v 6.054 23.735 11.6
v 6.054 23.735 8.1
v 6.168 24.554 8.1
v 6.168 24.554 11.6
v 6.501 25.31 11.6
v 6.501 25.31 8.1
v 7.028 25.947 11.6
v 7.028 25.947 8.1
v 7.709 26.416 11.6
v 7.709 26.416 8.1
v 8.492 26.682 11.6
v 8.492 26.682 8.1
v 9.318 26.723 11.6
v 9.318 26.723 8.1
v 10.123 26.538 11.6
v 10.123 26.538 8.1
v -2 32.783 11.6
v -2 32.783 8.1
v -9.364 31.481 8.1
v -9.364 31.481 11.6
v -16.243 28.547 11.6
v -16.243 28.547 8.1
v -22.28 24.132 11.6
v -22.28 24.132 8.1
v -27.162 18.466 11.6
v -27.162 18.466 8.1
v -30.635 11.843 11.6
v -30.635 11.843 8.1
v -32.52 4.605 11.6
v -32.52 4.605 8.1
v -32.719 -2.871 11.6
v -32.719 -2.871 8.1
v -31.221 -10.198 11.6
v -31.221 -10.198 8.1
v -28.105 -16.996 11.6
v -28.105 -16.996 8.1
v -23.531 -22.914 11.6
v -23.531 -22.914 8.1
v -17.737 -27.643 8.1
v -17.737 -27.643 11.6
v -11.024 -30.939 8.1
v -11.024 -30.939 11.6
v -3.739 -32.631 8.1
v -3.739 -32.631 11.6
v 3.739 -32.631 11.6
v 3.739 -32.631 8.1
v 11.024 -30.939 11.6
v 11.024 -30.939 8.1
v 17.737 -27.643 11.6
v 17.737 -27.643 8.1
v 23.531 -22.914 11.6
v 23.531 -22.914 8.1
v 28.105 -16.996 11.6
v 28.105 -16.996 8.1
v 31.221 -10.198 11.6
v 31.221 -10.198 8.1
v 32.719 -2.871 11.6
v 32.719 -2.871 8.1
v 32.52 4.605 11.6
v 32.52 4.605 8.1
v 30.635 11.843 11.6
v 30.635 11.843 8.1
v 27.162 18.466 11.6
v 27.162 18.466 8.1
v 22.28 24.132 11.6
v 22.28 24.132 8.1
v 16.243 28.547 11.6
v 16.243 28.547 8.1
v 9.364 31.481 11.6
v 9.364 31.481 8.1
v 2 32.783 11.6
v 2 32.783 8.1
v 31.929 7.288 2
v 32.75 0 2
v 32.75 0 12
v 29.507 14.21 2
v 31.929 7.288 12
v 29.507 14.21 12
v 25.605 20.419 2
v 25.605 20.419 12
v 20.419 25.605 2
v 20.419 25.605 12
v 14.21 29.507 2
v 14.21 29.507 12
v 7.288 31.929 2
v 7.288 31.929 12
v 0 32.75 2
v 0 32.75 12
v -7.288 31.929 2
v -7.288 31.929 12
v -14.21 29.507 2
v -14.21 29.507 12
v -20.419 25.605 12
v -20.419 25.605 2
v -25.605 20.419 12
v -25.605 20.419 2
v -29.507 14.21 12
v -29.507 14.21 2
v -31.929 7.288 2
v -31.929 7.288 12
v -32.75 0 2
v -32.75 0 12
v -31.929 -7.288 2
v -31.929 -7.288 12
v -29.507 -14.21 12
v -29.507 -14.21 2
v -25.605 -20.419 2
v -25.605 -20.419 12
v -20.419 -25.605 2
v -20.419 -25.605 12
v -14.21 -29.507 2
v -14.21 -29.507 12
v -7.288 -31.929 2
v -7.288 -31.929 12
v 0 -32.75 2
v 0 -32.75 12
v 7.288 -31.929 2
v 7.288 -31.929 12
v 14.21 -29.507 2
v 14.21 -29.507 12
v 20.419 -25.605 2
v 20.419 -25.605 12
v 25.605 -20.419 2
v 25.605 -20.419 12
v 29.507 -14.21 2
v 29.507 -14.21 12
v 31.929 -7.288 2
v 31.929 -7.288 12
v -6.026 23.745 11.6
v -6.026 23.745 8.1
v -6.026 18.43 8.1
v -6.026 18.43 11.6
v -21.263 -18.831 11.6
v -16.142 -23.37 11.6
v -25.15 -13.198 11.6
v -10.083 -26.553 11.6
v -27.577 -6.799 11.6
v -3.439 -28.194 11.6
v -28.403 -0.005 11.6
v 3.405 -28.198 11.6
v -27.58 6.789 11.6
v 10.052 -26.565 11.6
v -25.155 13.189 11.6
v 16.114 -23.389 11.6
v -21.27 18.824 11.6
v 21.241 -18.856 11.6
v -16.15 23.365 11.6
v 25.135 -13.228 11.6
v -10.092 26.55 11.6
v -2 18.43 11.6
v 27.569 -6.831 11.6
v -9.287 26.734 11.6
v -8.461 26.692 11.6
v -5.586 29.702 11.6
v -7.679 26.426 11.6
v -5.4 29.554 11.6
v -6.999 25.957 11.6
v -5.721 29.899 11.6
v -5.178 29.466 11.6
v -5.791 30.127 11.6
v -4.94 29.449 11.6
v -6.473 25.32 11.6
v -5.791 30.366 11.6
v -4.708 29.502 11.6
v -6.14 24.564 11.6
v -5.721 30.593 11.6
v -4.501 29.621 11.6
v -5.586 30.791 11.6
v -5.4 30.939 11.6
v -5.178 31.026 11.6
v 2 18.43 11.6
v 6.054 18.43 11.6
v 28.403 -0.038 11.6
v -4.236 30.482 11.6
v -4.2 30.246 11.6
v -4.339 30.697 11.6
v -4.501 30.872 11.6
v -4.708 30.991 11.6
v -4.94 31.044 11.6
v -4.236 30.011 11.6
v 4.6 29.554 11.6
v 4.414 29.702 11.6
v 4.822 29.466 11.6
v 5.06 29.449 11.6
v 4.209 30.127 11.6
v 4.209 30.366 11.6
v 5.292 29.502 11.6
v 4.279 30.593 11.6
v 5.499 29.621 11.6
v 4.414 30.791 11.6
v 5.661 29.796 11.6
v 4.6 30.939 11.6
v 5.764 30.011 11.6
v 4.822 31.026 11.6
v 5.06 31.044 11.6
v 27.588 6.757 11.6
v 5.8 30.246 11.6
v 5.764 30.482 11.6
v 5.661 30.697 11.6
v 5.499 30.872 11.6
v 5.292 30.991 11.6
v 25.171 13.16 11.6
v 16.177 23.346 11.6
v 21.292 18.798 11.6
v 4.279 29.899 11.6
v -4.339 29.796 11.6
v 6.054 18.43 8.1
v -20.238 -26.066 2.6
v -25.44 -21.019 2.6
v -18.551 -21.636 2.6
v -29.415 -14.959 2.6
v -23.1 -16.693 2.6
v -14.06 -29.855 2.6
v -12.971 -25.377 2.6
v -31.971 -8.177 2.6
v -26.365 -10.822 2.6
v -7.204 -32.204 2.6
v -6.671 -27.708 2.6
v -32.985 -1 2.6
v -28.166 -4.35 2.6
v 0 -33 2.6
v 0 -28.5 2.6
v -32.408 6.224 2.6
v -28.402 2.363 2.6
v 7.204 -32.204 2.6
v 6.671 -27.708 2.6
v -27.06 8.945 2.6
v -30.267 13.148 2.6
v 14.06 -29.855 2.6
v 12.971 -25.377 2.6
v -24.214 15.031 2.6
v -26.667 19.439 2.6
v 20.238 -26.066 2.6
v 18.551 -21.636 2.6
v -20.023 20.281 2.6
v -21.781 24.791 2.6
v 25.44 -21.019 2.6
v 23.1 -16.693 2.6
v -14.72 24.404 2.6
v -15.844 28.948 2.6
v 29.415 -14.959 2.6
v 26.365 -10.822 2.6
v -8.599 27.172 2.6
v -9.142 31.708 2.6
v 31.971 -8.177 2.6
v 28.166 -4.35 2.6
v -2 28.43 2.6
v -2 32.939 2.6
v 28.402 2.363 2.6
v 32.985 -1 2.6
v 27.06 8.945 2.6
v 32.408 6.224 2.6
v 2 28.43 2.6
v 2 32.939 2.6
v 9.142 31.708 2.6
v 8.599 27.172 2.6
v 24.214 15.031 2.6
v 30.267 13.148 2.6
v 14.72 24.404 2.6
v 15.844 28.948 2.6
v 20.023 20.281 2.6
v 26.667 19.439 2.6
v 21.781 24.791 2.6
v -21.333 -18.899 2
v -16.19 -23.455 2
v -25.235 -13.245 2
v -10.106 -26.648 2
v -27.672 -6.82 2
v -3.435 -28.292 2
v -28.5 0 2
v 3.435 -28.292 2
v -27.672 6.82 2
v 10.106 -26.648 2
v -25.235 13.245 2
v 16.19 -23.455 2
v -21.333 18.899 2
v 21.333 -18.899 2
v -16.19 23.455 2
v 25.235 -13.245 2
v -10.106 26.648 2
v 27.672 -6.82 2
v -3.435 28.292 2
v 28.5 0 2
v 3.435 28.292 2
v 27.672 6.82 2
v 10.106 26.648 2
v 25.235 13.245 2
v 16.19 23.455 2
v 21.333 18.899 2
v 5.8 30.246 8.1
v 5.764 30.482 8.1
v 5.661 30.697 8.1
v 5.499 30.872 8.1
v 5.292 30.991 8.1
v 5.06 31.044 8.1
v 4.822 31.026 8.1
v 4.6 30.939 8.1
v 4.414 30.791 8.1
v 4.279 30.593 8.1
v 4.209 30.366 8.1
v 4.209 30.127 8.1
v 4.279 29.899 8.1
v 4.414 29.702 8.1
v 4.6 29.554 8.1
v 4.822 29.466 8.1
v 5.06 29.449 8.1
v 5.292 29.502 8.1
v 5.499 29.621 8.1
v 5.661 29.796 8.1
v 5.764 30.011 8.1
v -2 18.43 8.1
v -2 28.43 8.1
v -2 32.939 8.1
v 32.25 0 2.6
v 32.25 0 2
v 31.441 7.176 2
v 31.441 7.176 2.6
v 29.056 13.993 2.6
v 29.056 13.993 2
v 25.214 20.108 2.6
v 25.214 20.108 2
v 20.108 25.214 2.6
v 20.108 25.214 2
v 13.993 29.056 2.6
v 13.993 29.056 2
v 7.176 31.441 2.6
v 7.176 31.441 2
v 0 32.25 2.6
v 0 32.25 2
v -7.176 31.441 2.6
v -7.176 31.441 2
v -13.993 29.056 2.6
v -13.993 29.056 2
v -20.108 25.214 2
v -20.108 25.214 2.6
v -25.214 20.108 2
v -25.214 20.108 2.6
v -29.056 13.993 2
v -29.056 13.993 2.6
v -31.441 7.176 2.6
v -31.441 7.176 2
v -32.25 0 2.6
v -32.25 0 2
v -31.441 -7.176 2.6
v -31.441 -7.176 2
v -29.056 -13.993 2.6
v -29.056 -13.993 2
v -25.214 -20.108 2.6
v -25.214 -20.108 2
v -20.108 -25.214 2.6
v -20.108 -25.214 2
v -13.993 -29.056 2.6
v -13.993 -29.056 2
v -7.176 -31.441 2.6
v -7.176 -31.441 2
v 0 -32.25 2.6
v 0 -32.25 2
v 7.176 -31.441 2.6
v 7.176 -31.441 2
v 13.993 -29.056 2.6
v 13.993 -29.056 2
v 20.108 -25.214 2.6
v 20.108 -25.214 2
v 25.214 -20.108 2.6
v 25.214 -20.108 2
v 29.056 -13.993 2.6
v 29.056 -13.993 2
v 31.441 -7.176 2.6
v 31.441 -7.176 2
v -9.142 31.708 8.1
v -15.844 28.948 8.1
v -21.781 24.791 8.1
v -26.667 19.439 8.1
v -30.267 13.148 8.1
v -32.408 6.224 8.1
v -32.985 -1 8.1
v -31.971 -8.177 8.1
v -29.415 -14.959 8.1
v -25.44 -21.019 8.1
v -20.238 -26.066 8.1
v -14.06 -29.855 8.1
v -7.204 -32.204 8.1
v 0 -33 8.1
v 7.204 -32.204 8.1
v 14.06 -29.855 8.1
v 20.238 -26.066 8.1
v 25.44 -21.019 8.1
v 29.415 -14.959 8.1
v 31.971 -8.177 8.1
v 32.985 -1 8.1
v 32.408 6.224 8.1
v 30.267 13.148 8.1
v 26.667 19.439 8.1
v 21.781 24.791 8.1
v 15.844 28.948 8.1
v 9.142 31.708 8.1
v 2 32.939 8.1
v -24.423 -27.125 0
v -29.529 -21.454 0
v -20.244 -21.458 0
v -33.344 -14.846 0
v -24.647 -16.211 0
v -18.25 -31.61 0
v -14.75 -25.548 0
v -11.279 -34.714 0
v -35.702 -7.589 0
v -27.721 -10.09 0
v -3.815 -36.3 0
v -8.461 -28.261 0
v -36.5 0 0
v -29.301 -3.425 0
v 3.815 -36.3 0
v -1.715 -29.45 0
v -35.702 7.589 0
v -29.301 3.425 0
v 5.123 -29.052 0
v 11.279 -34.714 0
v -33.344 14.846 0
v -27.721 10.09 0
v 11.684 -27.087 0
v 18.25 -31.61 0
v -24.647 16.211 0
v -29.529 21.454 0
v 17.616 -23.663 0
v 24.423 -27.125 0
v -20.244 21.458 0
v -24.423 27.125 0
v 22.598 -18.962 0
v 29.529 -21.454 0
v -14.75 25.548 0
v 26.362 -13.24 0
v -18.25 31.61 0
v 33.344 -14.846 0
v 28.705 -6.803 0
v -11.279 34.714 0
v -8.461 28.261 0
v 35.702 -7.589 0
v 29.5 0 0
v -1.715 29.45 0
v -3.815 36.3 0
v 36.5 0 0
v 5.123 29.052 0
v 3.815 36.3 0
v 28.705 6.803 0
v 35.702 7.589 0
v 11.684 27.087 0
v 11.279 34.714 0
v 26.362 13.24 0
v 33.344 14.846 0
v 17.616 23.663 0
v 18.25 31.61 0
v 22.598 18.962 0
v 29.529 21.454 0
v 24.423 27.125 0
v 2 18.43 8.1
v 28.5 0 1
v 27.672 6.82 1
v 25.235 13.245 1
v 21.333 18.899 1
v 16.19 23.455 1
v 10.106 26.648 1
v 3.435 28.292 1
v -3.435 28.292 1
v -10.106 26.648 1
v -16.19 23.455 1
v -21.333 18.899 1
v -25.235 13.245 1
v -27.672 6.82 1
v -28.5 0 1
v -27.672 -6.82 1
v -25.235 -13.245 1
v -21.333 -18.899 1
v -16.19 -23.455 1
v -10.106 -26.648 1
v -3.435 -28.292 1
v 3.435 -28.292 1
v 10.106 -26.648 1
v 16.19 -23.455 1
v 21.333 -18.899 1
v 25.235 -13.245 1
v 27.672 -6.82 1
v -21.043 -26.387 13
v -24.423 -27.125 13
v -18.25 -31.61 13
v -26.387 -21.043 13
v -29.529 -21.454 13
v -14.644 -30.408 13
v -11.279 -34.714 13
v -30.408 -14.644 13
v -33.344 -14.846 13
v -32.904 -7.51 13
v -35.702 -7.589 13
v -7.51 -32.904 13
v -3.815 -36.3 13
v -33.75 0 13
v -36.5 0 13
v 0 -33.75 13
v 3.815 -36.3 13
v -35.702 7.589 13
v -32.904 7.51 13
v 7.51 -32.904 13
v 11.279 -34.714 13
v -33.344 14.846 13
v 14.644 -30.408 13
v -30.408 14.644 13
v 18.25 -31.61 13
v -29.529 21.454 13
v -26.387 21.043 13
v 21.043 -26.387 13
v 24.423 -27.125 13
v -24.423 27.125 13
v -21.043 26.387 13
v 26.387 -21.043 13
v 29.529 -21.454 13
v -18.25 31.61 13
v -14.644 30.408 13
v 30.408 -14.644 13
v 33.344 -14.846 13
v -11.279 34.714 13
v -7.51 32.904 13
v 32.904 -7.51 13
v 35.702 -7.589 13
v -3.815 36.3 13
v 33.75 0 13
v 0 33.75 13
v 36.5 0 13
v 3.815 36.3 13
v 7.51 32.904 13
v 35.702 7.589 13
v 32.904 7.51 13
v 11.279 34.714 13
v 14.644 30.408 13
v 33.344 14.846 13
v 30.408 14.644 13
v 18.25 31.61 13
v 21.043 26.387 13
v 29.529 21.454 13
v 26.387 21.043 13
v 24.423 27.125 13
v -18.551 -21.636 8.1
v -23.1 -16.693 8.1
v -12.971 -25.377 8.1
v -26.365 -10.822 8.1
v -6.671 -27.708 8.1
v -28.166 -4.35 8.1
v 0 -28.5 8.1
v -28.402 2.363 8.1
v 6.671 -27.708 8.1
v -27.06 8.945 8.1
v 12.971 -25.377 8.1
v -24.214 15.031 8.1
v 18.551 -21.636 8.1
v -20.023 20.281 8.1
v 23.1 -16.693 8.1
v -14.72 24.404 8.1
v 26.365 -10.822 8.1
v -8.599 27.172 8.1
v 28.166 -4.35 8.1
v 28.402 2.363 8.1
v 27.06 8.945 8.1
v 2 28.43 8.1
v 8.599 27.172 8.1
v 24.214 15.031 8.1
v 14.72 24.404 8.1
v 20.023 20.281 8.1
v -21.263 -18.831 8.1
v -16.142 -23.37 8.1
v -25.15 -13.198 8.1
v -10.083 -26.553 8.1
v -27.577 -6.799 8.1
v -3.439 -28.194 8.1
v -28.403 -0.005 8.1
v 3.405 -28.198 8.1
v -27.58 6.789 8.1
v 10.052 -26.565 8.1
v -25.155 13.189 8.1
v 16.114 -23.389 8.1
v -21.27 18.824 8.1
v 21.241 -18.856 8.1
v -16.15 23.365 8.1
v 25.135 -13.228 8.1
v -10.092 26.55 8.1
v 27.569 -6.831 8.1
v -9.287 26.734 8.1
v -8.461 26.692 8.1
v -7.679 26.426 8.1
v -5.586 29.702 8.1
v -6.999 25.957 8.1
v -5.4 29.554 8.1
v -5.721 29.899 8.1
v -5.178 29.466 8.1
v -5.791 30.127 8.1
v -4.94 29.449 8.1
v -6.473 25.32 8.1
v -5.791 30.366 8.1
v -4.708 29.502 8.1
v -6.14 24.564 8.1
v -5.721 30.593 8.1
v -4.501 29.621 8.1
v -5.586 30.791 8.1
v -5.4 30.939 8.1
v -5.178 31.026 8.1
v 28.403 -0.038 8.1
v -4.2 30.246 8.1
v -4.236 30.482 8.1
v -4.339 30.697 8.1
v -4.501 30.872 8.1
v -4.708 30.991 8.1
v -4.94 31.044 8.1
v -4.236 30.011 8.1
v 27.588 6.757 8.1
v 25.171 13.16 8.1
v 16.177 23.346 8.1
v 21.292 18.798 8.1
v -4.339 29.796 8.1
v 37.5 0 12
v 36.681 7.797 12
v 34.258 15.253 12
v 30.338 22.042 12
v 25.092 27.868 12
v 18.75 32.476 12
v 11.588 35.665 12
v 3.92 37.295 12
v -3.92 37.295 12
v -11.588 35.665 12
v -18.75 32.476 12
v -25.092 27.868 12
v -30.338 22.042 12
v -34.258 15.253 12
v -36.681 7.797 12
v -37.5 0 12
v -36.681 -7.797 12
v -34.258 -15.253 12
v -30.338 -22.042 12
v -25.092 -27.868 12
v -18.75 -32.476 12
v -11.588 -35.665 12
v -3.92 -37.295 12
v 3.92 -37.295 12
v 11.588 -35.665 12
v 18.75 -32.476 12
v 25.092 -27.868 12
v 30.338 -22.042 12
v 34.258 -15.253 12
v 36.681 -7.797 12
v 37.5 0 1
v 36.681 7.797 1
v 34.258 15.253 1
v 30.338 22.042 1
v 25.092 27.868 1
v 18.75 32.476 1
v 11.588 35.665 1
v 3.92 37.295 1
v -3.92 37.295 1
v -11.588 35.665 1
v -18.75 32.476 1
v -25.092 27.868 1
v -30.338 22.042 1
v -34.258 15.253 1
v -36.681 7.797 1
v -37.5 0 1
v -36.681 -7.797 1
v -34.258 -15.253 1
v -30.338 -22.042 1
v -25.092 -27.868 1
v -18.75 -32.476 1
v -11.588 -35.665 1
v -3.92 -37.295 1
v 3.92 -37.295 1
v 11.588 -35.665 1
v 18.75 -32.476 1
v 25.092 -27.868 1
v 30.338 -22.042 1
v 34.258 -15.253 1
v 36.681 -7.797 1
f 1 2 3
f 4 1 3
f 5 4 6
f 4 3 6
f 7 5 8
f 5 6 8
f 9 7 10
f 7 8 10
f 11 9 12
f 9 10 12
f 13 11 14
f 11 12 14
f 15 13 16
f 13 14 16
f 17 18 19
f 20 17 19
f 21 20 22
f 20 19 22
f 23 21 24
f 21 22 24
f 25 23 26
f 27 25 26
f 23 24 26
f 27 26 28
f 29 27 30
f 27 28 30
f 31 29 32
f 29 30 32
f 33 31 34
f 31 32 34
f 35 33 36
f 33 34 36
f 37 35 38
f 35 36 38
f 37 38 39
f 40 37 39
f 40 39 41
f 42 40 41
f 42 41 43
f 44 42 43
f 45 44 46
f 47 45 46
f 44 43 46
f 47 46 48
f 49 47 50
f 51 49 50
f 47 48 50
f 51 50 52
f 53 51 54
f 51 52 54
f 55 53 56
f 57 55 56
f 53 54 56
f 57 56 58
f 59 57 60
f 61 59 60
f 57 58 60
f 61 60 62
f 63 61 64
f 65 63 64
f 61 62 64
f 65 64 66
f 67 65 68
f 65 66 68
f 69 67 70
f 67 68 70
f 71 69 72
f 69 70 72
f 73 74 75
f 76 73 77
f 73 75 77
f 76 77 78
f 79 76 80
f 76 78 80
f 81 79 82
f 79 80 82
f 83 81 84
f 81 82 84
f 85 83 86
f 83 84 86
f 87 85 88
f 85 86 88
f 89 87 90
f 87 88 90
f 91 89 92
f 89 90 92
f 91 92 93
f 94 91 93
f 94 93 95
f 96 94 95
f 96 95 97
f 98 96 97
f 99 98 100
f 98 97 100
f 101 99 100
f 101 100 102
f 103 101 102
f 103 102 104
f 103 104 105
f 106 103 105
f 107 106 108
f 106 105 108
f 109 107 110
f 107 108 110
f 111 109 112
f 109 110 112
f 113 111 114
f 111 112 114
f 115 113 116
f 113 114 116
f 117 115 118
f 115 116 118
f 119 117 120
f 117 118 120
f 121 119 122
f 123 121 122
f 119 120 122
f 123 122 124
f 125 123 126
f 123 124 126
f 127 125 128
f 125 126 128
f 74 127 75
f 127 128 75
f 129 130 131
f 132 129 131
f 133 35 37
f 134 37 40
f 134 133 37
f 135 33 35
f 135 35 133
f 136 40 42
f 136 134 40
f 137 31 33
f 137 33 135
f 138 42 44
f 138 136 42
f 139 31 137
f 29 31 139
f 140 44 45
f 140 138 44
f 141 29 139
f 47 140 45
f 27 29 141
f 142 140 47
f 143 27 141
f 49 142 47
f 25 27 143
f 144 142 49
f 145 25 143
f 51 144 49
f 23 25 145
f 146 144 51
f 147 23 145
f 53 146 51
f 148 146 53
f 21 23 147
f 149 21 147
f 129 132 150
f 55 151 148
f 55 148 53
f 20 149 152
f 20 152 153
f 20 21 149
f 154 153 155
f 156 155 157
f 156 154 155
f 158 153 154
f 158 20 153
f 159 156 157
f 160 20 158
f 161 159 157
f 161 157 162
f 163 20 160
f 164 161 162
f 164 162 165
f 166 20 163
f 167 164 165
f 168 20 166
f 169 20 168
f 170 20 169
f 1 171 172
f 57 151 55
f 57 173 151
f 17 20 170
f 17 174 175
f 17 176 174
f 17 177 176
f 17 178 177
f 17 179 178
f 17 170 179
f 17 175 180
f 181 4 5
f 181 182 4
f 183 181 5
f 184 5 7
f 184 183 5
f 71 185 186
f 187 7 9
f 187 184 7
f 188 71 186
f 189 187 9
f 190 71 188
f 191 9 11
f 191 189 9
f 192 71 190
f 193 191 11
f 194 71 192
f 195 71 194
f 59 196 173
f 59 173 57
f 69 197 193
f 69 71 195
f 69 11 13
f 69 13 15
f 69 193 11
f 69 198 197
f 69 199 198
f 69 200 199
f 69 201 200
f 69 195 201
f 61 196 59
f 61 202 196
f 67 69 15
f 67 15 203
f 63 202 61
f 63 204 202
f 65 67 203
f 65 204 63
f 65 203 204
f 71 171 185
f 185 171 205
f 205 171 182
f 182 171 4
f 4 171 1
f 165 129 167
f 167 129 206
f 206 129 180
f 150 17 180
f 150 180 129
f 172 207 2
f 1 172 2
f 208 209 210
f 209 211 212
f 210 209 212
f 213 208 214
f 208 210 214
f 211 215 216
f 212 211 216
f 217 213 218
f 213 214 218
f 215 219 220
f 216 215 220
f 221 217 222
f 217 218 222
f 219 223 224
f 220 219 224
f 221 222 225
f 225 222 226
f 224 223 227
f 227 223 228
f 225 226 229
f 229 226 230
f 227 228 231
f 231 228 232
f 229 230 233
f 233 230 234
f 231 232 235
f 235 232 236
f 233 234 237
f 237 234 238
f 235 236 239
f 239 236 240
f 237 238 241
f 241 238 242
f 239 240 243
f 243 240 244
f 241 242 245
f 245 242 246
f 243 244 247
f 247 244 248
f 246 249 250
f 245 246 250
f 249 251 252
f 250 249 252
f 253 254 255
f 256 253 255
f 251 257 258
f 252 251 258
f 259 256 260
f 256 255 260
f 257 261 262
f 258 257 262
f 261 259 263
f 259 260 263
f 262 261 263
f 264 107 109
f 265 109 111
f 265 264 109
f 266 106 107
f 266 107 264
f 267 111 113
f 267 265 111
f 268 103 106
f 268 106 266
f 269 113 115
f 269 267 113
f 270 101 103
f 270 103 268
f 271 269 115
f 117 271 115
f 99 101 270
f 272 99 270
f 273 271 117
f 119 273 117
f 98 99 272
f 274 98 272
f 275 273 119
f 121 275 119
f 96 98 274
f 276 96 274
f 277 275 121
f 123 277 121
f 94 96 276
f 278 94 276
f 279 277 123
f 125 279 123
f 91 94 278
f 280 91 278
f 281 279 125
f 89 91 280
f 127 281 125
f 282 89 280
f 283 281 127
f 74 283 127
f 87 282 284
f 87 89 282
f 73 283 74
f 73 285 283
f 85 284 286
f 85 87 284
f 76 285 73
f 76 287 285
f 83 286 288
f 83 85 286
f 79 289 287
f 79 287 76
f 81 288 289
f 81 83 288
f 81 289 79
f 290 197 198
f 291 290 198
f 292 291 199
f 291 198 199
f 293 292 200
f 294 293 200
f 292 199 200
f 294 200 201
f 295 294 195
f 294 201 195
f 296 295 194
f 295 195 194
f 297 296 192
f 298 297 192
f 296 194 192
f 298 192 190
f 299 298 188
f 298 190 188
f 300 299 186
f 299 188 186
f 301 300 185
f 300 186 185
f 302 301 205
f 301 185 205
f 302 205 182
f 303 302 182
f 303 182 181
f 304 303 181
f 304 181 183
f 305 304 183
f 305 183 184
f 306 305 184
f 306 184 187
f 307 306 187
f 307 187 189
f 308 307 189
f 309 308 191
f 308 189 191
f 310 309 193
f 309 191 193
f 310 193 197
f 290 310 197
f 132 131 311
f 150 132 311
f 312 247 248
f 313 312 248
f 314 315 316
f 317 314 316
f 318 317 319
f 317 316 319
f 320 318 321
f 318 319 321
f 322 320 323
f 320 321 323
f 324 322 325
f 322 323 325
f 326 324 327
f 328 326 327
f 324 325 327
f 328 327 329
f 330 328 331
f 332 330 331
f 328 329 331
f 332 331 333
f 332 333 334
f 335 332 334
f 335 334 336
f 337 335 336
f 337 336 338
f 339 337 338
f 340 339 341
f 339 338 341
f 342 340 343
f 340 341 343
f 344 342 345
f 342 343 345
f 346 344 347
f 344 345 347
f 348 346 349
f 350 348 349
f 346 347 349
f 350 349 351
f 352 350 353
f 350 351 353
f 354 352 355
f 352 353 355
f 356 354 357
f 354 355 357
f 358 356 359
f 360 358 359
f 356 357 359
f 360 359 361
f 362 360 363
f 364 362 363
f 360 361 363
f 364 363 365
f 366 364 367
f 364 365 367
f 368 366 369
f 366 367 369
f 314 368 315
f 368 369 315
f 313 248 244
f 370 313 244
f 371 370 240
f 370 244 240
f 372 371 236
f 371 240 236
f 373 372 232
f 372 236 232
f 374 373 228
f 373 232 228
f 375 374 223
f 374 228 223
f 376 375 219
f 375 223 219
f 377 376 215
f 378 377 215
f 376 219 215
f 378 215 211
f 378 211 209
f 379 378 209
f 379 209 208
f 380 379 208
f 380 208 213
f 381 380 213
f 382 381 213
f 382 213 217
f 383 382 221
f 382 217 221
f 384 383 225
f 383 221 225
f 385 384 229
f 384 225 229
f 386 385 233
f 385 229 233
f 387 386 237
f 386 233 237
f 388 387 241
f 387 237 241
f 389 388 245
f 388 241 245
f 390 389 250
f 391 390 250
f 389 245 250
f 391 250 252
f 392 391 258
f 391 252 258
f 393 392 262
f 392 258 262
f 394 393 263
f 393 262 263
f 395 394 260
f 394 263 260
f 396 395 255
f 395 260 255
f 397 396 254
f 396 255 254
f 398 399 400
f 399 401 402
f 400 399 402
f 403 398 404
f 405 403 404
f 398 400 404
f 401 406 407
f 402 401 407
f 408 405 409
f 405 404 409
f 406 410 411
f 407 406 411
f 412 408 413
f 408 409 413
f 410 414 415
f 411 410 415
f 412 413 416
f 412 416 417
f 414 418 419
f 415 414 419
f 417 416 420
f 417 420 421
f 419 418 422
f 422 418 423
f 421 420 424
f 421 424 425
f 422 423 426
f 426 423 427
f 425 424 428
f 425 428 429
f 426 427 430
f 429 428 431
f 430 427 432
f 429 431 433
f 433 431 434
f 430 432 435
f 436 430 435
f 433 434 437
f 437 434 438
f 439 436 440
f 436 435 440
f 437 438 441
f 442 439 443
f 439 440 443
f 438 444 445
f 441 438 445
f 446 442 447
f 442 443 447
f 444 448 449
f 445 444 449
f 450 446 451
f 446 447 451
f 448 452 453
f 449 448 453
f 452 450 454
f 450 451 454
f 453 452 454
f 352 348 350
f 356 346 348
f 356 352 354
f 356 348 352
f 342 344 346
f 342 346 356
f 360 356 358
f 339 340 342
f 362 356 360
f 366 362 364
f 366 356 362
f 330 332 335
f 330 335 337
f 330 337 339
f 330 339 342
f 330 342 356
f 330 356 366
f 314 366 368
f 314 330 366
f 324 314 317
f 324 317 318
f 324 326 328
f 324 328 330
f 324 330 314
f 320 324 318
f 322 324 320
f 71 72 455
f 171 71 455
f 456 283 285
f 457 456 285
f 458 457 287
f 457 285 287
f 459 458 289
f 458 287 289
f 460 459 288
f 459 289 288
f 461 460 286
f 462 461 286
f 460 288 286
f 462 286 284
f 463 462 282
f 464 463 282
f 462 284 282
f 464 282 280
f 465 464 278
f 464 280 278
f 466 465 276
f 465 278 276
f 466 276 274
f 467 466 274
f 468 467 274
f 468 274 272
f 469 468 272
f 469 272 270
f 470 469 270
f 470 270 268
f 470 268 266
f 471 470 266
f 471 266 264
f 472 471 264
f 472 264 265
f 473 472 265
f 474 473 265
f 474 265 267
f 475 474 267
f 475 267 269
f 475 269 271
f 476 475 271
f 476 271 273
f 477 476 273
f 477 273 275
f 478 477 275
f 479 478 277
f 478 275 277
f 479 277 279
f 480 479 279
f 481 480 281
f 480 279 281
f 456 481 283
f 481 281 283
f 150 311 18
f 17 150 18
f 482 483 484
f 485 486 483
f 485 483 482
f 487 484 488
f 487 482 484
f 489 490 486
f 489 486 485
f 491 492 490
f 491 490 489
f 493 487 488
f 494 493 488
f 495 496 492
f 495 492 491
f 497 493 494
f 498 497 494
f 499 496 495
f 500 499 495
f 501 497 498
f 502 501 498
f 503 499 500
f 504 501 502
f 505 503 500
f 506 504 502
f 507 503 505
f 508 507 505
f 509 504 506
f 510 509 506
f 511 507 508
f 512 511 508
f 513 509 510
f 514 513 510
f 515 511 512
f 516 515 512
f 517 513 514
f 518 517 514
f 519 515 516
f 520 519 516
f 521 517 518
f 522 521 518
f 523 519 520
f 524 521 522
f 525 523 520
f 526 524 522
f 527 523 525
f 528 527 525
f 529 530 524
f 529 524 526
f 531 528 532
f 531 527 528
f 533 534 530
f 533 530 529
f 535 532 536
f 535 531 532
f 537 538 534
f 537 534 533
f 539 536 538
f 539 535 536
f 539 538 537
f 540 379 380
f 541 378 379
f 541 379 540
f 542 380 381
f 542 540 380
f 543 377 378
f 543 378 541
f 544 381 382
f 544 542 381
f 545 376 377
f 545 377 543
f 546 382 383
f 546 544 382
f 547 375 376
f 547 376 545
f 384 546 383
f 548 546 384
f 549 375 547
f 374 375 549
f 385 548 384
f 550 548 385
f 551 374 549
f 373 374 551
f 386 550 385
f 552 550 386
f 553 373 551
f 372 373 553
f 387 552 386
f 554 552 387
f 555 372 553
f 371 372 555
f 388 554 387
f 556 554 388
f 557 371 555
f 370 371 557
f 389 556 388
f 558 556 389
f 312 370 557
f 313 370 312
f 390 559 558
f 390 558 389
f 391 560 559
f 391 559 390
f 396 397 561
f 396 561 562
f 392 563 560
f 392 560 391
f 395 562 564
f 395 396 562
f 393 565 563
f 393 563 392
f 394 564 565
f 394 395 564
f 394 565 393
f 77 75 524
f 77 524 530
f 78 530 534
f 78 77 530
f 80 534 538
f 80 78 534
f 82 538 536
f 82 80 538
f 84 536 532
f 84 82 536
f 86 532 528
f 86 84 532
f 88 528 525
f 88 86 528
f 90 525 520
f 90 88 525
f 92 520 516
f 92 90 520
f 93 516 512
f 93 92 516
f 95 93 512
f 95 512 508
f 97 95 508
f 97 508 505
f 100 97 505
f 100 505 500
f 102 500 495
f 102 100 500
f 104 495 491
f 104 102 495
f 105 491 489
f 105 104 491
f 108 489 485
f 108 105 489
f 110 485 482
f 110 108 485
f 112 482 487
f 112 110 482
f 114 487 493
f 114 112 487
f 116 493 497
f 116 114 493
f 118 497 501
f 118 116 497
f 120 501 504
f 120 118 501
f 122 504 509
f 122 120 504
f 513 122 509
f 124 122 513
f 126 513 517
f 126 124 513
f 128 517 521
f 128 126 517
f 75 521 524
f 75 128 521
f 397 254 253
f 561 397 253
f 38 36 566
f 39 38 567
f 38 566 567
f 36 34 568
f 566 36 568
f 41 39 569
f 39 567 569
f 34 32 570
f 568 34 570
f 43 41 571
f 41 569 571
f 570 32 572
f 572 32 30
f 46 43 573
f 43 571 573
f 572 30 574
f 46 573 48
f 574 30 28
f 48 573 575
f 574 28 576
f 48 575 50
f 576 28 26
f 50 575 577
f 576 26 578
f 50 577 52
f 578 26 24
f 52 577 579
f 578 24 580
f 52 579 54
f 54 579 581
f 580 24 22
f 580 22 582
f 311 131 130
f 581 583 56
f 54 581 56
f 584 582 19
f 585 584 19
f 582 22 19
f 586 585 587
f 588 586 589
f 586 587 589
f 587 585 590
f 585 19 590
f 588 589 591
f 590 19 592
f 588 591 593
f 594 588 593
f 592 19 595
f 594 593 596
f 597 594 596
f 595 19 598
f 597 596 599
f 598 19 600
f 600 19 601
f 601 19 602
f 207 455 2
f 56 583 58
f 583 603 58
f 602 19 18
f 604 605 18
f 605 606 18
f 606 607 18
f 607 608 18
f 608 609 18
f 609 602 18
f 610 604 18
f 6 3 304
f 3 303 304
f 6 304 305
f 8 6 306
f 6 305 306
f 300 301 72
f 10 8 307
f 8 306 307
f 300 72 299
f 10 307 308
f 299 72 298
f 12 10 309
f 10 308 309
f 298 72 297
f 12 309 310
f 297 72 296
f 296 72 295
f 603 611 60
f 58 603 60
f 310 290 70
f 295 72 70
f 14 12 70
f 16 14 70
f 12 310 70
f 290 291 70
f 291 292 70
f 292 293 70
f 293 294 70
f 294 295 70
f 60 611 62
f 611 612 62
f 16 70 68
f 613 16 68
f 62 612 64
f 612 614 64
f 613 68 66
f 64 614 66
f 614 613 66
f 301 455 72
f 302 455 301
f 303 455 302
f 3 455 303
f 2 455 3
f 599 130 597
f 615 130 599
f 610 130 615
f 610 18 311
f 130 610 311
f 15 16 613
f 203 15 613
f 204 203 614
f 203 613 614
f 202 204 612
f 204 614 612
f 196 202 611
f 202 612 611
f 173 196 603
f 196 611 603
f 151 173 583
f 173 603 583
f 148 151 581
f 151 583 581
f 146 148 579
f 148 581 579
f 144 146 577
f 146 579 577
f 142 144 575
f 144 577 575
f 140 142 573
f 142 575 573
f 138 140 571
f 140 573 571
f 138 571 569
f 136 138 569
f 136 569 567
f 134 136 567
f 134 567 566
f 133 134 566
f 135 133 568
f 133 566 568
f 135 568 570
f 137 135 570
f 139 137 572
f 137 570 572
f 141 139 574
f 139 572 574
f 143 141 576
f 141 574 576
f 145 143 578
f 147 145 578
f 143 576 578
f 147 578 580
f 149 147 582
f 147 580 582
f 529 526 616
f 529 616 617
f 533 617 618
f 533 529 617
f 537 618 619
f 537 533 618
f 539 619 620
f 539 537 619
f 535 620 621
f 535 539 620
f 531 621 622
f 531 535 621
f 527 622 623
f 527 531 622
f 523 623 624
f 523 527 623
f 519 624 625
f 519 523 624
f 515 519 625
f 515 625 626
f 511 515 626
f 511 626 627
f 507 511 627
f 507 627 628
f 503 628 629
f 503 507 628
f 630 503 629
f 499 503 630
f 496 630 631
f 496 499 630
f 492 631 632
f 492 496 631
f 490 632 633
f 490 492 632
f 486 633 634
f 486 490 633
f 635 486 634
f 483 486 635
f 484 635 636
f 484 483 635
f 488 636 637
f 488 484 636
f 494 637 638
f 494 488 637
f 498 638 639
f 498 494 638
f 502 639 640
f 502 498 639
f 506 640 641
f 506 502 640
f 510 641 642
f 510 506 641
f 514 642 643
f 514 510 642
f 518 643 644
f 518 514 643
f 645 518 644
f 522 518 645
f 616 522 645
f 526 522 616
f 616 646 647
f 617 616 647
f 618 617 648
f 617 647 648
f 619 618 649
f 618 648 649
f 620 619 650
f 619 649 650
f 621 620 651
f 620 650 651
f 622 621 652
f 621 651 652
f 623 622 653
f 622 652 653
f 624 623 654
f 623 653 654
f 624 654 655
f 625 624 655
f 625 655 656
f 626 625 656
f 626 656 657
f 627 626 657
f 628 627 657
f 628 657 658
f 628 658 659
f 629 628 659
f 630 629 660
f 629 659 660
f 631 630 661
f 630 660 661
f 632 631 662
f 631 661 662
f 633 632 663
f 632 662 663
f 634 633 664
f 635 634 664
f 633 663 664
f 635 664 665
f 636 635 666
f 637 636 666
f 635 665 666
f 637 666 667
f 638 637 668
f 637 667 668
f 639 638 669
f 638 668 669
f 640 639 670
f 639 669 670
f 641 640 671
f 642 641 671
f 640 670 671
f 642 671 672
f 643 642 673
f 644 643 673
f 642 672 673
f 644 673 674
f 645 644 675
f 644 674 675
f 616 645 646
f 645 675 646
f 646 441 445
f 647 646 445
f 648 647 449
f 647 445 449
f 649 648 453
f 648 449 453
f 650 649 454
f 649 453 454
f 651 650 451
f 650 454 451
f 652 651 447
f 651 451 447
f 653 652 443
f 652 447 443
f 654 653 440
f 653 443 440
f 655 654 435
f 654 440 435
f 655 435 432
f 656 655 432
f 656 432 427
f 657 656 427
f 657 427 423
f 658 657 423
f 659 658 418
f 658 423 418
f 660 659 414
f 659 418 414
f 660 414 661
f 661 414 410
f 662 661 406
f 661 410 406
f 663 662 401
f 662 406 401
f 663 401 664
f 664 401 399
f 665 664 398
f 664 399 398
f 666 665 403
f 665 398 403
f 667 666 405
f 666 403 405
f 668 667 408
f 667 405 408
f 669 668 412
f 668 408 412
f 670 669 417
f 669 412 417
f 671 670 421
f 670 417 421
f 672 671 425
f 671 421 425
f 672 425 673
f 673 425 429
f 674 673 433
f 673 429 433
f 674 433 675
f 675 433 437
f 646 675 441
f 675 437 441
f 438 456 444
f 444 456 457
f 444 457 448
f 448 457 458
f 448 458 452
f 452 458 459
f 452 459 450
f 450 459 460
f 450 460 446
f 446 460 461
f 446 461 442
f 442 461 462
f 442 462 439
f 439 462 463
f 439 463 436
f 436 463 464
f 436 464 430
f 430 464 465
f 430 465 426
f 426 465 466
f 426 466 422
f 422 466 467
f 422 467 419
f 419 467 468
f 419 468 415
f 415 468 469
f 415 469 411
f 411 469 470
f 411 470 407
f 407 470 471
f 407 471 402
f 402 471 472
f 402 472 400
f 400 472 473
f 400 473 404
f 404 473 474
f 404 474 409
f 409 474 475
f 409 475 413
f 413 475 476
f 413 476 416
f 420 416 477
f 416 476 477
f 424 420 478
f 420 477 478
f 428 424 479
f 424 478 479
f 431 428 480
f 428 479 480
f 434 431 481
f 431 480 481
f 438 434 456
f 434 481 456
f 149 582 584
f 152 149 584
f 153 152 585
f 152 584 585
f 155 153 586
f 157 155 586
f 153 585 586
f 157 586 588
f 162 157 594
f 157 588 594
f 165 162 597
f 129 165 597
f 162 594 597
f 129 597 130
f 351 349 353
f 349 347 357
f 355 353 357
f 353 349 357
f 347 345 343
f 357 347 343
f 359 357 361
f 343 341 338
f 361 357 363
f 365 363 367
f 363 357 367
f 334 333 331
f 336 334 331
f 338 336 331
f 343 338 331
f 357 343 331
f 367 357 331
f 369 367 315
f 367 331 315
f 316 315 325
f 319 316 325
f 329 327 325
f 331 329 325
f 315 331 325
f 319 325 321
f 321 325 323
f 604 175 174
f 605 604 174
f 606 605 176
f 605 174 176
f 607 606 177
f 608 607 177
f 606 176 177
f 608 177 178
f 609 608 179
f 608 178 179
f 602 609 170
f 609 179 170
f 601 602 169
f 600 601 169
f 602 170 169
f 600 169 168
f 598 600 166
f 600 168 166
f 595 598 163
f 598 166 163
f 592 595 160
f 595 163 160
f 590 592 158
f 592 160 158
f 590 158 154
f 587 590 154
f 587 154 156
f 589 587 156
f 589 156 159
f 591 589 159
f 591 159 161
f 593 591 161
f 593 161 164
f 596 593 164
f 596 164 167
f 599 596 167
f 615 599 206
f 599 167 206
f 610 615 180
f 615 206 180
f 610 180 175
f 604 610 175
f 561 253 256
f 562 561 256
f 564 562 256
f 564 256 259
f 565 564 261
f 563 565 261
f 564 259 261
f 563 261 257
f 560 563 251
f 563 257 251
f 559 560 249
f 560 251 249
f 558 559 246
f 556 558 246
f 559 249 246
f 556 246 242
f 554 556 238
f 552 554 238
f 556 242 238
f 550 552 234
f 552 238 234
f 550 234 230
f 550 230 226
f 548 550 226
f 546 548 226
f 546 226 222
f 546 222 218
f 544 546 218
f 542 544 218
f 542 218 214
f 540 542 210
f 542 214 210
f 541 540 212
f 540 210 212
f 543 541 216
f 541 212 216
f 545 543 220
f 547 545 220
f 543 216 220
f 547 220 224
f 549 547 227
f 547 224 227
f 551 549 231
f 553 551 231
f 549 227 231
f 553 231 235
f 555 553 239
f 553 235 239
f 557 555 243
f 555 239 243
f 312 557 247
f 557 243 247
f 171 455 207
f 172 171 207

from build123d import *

# Parameters (mm, degrees)
F0_R      = 37.5
F1_DEPTH  = 13
F2_R      = 32.75
F3_DEPTH  = 11
F4_R      = 28.5
F5_DEPTH  = 25
F6_R      = 32.25
F7_DEPTH  = 0.6
F9_DEPTH  = 5.5
F11_DEPTH = 3.5
F12_SIZE  = 1
F13_R     = 0.8
F14_DEPTH = 3.5


with BuildPart() as f1:
    # F0 (on Top) → F1 (new body)
    with BuildSketch(Plane.XY):
        Circle(F0_R)
    extrude(amount=F1_DEPTH)

    # F2 (on face) → F3 (cut)
    with BuildSketch(Plane.XY.offset(13)):
        Circle(F2_R)
    extrude(amount=-F3_DEPTH, mode=Mode.SUBTRACT)

    # F4 (on face) → F5 (cut)
    with BuildSketch(Plane.XY.offset(2)):
        Circle(F4_R)
    extrude(amount=-F5_DEPTH, mode=Mode.SUBTRACT)

    # F12
    f12_edges = [f1.edges().sort_by_distance(p)[0] for p in [
        (-37.5, 0, 0),
        (-37.5, 0, 13),
        (-32.75, 0, 13),
        (-28.5, 0, 0),
    ]]
    chamfer(f12_edges, length=F12_SIZE)


with BuildPart() as f7:
    # F6 (on face) → F7 (new body)
    with BuildSketch(Plane.XY.offset(2)):
        Circle(F6_R)
    extrude(amount=F7_DEPTH)


with BuildPart() as f9:
    # F8 (on face) → F9 (new body)
    with BuildSketch(Plane.XY.offset(2.6)):
        with BuildLine():
            Line((-2, 28.429738), (-2, 32.939338))
            ThreePointArc((-2, 32.939338), (0, -33), (2, 32.939338))
            Line((2, 32.939338), (2, 28.429738))
            ThreePointArc((2, 28.429738), (0, -28.5), (-2, 28.429738))
        make_face()
    extrude(amount=F9_DEPTH)


with BuildPart() as f11:
    # F10 (on face) → F11 (new body)
    with BuildSketch(Plane.XY.offset(8.1)):
        with BuildLine():
            Line((-2, 28.429738), (-2, 32.783408))
            ThreePointArc((-2, 32.783408), (0, -32.844357), (2, 32.783408))
            Line((2, 32.783408), (2, 28.429738))
            Line((2, 28.429738), (2, 28.332556))
            Line((2, 28.332556), (2, 18.429738))
            Line((2, 18.429738), (6.054054, 18.429738))
            Line((6.054054, 18.429738), (6.054054, 23.734774))
            ThreePointArc((6.054054, 23.734774), (7.352252, 26.205376), (10.123301, 26.537757))
            ThreePointArc((10.123301, 26.537757), (-0.016756, -28.403054), (-10.091983, 26.549682))
            ThreePointArc((-10.091983, 26.549682), (-7.322785, 26.215037), (-6.026044, 23.74544))
            Line((-6.026044, 23.74544), (-6.026044, 18.429738))
            Line((-6.026044, 18.429738), (-2, 18.429738))
            Line((-2, 18.429738), (-2, 28.429738))
        make_face()
    extrude(amount=F11_DEPTH)

    # F13 (on face) → F14 (cut, through all)
    with BuildSketch(Plane.XY.offset(11.6)):
        with Locations((5, 30.246386)):
            Circle(F13_R)
        with Locations((-5, 30.246386)):
            Circle(F13_R)
    extrude(amount=-F14_DEPTH, mode=Mode.SUBTRACT)


solid = Compound([f1.part, f7.part, f9.part, f11.part])
